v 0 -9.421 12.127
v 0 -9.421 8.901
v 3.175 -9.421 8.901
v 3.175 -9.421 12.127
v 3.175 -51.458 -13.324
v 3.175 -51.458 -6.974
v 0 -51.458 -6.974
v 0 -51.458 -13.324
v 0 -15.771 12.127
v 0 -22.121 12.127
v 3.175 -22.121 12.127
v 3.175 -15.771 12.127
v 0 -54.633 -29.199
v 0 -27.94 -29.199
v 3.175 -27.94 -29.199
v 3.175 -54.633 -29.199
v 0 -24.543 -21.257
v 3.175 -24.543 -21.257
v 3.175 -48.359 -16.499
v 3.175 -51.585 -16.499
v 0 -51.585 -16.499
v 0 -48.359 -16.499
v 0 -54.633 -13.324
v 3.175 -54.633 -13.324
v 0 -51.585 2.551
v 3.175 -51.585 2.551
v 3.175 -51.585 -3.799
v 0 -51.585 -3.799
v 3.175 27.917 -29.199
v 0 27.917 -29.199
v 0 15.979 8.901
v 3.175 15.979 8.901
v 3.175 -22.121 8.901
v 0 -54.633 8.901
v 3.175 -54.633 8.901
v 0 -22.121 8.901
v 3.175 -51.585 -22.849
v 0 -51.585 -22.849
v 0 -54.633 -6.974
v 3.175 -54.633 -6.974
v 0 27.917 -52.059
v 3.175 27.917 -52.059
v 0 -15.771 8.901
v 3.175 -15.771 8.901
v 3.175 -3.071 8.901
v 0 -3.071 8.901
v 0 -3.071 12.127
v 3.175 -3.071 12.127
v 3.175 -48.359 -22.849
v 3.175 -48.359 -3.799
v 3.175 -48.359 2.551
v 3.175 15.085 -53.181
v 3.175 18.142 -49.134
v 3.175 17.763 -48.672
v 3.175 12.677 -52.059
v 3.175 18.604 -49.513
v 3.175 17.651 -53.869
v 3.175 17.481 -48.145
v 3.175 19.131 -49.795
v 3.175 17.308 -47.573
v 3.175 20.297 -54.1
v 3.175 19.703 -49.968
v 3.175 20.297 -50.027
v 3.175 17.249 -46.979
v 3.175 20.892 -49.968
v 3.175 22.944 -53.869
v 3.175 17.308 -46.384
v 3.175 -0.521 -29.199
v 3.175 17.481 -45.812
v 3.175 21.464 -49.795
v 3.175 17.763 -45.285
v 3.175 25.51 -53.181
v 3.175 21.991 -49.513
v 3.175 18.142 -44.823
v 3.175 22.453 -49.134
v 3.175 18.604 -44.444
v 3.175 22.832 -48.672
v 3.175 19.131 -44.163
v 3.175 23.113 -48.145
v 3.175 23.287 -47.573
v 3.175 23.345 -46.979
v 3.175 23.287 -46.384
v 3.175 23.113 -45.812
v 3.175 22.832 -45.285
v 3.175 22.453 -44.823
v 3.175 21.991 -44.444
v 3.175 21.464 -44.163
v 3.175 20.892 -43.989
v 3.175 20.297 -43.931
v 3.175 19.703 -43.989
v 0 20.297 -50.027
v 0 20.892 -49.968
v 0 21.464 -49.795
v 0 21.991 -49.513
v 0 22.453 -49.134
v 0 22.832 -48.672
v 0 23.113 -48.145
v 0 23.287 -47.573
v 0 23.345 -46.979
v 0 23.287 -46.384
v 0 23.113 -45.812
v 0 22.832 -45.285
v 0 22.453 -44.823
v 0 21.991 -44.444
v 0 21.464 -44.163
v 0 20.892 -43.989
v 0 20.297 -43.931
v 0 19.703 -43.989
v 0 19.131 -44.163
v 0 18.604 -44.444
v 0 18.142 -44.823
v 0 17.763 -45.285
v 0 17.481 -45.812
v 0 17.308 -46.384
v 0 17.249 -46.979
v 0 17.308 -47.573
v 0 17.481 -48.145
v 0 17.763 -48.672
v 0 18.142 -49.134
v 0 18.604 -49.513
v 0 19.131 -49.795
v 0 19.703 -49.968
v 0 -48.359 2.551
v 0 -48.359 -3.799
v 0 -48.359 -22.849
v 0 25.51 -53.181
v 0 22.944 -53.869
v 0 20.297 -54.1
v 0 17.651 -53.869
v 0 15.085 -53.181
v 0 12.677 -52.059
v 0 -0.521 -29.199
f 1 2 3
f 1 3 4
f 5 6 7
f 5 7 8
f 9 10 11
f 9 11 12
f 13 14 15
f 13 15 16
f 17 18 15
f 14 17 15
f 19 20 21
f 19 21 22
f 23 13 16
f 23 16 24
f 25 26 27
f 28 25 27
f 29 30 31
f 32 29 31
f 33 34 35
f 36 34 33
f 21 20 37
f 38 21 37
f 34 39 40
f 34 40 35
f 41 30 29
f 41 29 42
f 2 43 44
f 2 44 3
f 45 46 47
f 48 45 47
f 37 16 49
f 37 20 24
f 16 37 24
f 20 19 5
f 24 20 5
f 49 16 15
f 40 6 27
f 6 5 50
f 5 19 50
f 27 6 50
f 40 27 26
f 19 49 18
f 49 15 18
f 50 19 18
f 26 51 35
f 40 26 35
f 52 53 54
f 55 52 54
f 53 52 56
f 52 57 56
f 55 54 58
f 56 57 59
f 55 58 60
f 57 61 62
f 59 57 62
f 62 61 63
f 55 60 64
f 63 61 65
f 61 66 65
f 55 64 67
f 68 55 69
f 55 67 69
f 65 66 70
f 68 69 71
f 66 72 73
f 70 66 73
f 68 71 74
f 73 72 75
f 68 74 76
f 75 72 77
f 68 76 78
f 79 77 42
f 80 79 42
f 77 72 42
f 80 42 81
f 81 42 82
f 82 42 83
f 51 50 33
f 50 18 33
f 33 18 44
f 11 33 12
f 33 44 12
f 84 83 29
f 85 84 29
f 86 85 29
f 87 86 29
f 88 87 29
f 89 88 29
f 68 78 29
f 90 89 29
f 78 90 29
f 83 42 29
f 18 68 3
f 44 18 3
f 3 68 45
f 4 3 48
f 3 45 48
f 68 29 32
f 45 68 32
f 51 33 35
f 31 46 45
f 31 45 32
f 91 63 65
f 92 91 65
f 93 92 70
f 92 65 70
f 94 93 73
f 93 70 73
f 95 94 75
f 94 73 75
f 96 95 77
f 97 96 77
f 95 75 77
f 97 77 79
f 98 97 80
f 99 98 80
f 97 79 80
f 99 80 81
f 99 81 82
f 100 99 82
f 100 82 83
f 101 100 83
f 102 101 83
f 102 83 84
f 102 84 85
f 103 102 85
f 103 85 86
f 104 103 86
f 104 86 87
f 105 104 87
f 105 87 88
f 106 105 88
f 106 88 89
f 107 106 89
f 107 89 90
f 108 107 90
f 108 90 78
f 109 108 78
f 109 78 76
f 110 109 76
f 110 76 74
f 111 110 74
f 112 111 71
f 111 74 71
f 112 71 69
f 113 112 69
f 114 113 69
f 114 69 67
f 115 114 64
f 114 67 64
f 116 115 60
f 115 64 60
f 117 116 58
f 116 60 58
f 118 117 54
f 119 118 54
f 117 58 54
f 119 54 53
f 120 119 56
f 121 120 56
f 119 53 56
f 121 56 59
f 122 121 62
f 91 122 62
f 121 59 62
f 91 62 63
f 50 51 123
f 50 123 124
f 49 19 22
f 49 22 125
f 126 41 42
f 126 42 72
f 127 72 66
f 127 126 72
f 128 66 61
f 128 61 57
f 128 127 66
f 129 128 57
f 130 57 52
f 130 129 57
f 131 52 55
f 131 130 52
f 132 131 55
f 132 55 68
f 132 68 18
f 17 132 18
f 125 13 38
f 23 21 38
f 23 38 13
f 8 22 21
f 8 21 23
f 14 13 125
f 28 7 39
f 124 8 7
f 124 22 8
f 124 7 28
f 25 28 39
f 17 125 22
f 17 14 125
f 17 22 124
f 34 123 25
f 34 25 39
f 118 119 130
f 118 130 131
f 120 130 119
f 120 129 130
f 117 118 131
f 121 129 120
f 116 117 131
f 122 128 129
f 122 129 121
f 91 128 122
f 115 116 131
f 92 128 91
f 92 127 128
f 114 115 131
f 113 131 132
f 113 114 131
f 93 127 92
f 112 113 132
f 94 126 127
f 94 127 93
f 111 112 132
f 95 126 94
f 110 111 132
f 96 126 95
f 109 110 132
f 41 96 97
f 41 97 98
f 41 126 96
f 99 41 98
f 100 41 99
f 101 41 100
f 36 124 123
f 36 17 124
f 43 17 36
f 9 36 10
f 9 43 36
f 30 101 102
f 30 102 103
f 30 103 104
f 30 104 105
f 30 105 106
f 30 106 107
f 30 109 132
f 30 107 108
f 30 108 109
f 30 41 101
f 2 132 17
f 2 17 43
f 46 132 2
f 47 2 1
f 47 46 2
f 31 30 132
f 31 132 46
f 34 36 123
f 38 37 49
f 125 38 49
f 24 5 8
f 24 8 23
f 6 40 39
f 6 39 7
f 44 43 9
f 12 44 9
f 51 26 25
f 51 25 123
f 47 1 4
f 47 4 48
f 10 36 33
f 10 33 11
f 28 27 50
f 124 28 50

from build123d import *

# Parameters (mm, degrees)
BOSS_EXTRUDE1_DEPTH       = 3.175
SKETCH3_R                 = 3.048
CUT_FOR_AXLE_DEPTH        = 4.175
SKETCH4_W                 = 6.35
SKETCH4_H                 = 3.2258
CUT_FOR_TABS_DEPTH        = 4.175
CUT_FOR_CLEARANCE_DEPTH   = 4.175
CUT_EXTRUDE1_DEPTH        = 4.175
SKETCH10_W                = 3.2258
SKETCH10_H                = 6.35
TABS_FOR_BACK_PLATE_DEPTH = 3.175


with BuildPart() as part:
    # Sketch1 → Boss-Extrude1 (new body)
    with BuildSketch(Plane(origin=(0, 0, 0), x_dir=(0, 0, -1), z_dir=(1, 0, 0))):
        with BuildLine():
            Line((-8.901335672, 27.917328656), (29.198664328, 27.917328656))
            Line((29.198664328, 27.917328656), (52.058664328, 27.917328656))
            ThreePointArc((52.058664328, 27.917328656), (54.100437174, 20.297328656), (52.058664328, 12.677328656))
            Line((52.058664328, 12.677328656), (29.198664328, -0.520898498))
            Line((29.198664328, -0.520898498), (29.198664328, -54.632671344))
            Line((29.198664328, -54.632671344), (-8.901335672, -54.632671344))
            Line((-8.901335672, -54.632671344), (-8.901335672, 27.917328656))
        make_face()
    extrude(amount=BOSS_EXTRUDE1_DEPTH)

    # Sketch3 → cut for axle (cut, through all)
    with BuildSketch(Plane(origin=(3.175, 0, 0), x_dir=(0, 0, -1), z_dir=(1, 0, 0))):
        with Locations((46.978664328, 20.297328656)):
            Circle(SKETCH3_R)
    extrude(amount=-CUT_FOR_AXLE_DEPTH, mode=Mode.SUBTRACT)

    # Sketch4 → cut for tabs (cut, through all)
    with BuildSketch(Plane(origin=(3.175, 0, 0), x_dir=(0, 0, -1), z_dir=(1, 0, 0))):
        with Locations((0.623664328, -49.971771344)):
            Rectangle(SKETCH4_W, SKETCH4_H)
        with Locations((19.673664328, -49.971771344)):
            Rectangle(SKETCH4_W, SKETCH4_H)
        Polygon((10.148664328, -54.632671344), (6.973664328, -54.632671344), (6.973664328, -51.457671344), (13.323664328, -51.457671344), (13.323664328, -54.632671344), align=None)
    extrude(amount=-CUT_FOR_TABS_DEPTH, mode=Mode.SUBTRACT)

    # Sketch6 → cut for clearance (cut, through all)
    with BuildSketch(Plane(origin=(3.175, 0, 0), x_dir=(0, 0, -1), z_dir=(1, 0, 0))):
        Polygon((29.198664328, -0.520898498), (21.256966839, -24.543474446), (29.198664328, -27.939523247), align=None)
    extrude(amount=-CUT_FOR_CLEARANCE_DEPTH, mode=Mode.SUBTRACT)

    # Sketch9 → Cut-Extrude1 (cut, through all)
    with BuildSketch(Plane.ZY):
        Polygon((8.901335672, 27.917328656), (-29.198664328, 27.917328656), (8.901335672, 15.979328656), align=None)
    extrude(amount=-CUT_EXTRUDE1_DEPTH, mode=Mode.SUBTRACT)

    # Sketch10 → tabs for back plate (add)
    with BuildSketch(Plane.ZY):
        with Locations((10.514235672, -6.245671344)):
            Rectangle(SKETCH10_W, SKETCH10_H)
        with Locations((10.514235672, -18.945671344)):
            Rectangle(SKETCH10_W, SKETCH10_H)
    extrude(amount=-TABS_FOR_BACK_PLATE_DEPTH)


solid = part.part
